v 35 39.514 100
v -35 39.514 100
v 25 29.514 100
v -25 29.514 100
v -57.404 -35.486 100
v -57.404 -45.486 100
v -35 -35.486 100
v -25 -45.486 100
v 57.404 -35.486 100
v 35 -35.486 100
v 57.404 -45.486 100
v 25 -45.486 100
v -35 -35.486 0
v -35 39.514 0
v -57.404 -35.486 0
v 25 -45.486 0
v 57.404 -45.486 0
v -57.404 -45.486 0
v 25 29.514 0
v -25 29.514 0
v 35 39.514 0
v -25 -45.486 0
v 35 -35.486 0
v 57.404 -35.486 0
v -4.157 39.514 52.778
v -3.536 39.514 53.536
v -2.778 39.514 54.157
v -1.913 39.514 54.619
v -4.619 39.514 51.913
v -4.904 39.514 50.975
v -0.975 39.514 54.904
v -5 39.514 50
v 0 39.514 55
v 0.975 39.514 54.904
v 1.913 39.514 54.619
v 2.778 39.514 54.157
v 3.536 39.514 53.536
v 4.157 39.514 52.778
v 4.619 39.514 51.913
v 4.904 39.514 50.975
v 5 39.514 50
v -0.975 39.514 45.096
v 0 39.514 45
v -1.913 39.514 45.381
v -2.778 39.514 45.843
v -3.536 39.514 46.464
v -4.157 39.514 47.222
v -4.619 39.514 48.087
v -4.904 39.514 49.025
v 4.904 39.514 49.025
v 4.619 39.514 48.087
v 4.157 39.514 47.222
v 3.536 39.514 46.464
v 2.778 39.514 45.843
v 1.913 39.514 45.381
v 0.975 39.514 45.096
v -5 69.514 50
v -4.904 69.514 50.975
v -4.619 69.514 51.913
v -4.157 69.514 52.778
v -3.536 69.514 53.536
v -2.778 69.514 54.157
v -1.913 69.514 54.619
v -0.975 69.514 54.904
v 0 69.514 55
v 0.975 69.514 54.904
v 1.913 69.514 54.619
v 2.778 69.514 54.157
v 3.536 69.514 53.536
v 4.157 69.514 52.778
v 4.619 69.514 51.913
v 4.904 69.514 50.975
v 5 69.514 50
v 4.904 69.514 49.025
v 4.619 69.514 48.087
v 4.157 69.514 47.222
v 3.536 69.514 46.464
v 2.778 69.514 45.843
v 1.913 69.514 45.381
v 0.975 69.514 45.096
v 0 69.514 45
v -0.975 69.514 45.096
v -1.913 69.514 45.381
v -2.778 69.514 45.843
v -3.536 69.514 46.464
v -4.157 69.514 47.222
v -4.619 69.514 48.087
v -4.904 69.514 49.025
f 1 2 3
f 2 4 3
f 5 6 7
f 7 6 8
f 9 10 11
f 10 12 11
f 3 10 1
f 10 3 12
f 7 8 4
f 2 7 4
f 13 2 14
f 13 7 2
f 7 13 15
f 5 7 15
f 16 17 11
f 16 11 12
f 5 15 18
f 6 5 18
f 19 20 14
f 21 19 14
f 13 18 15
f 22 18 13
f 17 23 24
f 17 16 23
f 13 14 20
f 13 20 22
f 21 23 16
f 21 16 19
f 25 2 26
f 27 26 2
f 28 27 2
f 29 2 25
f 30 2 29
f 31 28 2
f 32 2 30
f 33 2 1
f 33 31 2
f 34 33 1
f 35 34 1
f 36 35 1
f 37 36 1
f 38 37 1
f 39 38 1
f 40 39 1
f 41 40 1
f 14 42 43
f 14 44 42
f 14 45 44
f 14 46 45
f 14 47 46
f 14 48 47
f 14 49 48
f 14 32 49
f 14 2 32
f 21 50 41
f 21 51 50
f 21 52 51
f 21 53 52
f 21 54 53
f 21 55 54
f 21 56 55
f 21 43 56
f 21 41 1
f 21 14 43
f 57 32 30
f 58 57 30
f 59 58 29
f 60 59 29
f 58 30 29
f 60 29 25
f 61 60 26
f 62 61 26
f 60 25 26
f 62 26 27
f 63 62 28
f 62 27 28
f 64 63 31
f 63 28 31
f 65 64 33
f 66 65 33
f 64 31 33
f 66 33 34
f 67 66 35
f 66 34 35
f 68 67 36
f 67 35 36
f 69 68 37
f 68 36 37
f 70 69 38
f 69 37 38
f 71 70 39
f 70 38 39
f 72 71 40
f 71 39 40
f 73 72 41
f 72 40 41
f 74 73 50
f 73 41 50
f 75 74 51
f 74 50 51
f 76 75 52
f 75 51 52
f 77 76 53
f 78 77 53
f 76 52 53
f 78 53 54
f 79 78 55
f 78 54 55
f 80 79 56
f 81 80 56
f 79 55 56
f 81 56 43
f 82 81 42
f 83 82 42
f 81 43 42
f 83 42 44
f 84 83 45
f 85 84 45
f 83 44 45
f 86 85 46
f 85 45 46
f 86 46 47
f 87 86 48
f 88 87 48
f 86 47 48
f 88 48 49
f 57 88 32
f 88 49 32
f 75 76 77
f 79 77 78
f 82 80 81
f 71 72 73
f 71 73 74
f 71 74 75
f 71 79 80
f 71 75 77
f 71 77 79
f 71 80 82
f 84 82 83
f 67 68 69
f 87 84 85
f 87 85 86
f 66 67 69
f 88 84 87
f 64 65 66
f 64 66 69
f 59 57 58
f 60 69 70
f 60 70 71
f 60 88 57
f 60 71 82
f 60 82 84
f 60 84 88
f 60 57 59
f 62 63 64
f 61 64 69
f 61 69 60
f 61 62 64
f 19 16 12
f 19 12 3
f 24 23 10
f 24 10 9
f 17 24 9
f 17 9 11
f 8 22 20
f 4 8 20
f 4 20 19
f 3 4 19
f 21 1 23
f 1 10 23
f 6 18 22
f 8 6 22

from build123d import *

# Parameters (mm, degrees)
BOSS_EXTRUDE1_DEPTH   = 100
BOSS_EXTRUDE1_2_DEPTH = 100
SKETCH2_W             = 70
SKETCH2_H             = 100
BOSS_EXTRUDE2_DEPTH   = 10
SKETCH3_R             = 5
BOSS_EXTRUDE3_DEPTH   = 30


with BuildPart() as part:
    # Sketch1 → Boss-Extrude1 (new body)
    with BuildSketch(Plane.XY):
        Polygon((-57.404010399, -45.485546177), (-25, -45.485546177), (-25, 29.514453823), (-35, 29.514453823), (-35, -35.485546177), (-57.404010399, -35.485546177), align=None)
    extrude(amount=BOSS_EXTRUDE1_DEPTH)



with BuildPart() as body_2:
    # Sketch1 → Boss-Extrude1 2 (new body)
    with BuildSketch(Plane.XY):
        Polygon((25, 29.514453823), (35, 29.514453823), (35, -35.485546177), (57.404010399, -35.485546177), (57.404010399, -45.485546177), (25, -45.485546177), align=None)
    extrude(amount=BOSS_EXTRUDE1_2_DEPTH)


with BuildPart() as part_1:
    add(part.part)

    add(body_2.part)  # Boss-Extrude2 merges body 2
    # Sketch2 → Boss-Extrude2 (add)
    with BuildSketch(Plane(origin=(0, 29.514453823, 0), x_dir=(1, 0, 0), z_dir=(0, 1, 0))):
        with Locations((0, -50)):
            Rectangle(SKETCH2_W, SKETCH2_H)
    extrude(amount=BOSS_EXTRUDE2_DEPTH)

    # Sketch3 → Boss-Extrude3 (add)
    with BuildSketch(Plane(origin=(0, 39.514453823, 0), x_dir=(1, 0, 0), z_dir=(0, 1, 0))):
        with Locations(Location((0, -50, 0), (0, 0, 180))):
            Circle(SKETCH3_R)
    extrude(amount=BOSS_EXTRUDE3_DEPTH)


solid = part_1.part
